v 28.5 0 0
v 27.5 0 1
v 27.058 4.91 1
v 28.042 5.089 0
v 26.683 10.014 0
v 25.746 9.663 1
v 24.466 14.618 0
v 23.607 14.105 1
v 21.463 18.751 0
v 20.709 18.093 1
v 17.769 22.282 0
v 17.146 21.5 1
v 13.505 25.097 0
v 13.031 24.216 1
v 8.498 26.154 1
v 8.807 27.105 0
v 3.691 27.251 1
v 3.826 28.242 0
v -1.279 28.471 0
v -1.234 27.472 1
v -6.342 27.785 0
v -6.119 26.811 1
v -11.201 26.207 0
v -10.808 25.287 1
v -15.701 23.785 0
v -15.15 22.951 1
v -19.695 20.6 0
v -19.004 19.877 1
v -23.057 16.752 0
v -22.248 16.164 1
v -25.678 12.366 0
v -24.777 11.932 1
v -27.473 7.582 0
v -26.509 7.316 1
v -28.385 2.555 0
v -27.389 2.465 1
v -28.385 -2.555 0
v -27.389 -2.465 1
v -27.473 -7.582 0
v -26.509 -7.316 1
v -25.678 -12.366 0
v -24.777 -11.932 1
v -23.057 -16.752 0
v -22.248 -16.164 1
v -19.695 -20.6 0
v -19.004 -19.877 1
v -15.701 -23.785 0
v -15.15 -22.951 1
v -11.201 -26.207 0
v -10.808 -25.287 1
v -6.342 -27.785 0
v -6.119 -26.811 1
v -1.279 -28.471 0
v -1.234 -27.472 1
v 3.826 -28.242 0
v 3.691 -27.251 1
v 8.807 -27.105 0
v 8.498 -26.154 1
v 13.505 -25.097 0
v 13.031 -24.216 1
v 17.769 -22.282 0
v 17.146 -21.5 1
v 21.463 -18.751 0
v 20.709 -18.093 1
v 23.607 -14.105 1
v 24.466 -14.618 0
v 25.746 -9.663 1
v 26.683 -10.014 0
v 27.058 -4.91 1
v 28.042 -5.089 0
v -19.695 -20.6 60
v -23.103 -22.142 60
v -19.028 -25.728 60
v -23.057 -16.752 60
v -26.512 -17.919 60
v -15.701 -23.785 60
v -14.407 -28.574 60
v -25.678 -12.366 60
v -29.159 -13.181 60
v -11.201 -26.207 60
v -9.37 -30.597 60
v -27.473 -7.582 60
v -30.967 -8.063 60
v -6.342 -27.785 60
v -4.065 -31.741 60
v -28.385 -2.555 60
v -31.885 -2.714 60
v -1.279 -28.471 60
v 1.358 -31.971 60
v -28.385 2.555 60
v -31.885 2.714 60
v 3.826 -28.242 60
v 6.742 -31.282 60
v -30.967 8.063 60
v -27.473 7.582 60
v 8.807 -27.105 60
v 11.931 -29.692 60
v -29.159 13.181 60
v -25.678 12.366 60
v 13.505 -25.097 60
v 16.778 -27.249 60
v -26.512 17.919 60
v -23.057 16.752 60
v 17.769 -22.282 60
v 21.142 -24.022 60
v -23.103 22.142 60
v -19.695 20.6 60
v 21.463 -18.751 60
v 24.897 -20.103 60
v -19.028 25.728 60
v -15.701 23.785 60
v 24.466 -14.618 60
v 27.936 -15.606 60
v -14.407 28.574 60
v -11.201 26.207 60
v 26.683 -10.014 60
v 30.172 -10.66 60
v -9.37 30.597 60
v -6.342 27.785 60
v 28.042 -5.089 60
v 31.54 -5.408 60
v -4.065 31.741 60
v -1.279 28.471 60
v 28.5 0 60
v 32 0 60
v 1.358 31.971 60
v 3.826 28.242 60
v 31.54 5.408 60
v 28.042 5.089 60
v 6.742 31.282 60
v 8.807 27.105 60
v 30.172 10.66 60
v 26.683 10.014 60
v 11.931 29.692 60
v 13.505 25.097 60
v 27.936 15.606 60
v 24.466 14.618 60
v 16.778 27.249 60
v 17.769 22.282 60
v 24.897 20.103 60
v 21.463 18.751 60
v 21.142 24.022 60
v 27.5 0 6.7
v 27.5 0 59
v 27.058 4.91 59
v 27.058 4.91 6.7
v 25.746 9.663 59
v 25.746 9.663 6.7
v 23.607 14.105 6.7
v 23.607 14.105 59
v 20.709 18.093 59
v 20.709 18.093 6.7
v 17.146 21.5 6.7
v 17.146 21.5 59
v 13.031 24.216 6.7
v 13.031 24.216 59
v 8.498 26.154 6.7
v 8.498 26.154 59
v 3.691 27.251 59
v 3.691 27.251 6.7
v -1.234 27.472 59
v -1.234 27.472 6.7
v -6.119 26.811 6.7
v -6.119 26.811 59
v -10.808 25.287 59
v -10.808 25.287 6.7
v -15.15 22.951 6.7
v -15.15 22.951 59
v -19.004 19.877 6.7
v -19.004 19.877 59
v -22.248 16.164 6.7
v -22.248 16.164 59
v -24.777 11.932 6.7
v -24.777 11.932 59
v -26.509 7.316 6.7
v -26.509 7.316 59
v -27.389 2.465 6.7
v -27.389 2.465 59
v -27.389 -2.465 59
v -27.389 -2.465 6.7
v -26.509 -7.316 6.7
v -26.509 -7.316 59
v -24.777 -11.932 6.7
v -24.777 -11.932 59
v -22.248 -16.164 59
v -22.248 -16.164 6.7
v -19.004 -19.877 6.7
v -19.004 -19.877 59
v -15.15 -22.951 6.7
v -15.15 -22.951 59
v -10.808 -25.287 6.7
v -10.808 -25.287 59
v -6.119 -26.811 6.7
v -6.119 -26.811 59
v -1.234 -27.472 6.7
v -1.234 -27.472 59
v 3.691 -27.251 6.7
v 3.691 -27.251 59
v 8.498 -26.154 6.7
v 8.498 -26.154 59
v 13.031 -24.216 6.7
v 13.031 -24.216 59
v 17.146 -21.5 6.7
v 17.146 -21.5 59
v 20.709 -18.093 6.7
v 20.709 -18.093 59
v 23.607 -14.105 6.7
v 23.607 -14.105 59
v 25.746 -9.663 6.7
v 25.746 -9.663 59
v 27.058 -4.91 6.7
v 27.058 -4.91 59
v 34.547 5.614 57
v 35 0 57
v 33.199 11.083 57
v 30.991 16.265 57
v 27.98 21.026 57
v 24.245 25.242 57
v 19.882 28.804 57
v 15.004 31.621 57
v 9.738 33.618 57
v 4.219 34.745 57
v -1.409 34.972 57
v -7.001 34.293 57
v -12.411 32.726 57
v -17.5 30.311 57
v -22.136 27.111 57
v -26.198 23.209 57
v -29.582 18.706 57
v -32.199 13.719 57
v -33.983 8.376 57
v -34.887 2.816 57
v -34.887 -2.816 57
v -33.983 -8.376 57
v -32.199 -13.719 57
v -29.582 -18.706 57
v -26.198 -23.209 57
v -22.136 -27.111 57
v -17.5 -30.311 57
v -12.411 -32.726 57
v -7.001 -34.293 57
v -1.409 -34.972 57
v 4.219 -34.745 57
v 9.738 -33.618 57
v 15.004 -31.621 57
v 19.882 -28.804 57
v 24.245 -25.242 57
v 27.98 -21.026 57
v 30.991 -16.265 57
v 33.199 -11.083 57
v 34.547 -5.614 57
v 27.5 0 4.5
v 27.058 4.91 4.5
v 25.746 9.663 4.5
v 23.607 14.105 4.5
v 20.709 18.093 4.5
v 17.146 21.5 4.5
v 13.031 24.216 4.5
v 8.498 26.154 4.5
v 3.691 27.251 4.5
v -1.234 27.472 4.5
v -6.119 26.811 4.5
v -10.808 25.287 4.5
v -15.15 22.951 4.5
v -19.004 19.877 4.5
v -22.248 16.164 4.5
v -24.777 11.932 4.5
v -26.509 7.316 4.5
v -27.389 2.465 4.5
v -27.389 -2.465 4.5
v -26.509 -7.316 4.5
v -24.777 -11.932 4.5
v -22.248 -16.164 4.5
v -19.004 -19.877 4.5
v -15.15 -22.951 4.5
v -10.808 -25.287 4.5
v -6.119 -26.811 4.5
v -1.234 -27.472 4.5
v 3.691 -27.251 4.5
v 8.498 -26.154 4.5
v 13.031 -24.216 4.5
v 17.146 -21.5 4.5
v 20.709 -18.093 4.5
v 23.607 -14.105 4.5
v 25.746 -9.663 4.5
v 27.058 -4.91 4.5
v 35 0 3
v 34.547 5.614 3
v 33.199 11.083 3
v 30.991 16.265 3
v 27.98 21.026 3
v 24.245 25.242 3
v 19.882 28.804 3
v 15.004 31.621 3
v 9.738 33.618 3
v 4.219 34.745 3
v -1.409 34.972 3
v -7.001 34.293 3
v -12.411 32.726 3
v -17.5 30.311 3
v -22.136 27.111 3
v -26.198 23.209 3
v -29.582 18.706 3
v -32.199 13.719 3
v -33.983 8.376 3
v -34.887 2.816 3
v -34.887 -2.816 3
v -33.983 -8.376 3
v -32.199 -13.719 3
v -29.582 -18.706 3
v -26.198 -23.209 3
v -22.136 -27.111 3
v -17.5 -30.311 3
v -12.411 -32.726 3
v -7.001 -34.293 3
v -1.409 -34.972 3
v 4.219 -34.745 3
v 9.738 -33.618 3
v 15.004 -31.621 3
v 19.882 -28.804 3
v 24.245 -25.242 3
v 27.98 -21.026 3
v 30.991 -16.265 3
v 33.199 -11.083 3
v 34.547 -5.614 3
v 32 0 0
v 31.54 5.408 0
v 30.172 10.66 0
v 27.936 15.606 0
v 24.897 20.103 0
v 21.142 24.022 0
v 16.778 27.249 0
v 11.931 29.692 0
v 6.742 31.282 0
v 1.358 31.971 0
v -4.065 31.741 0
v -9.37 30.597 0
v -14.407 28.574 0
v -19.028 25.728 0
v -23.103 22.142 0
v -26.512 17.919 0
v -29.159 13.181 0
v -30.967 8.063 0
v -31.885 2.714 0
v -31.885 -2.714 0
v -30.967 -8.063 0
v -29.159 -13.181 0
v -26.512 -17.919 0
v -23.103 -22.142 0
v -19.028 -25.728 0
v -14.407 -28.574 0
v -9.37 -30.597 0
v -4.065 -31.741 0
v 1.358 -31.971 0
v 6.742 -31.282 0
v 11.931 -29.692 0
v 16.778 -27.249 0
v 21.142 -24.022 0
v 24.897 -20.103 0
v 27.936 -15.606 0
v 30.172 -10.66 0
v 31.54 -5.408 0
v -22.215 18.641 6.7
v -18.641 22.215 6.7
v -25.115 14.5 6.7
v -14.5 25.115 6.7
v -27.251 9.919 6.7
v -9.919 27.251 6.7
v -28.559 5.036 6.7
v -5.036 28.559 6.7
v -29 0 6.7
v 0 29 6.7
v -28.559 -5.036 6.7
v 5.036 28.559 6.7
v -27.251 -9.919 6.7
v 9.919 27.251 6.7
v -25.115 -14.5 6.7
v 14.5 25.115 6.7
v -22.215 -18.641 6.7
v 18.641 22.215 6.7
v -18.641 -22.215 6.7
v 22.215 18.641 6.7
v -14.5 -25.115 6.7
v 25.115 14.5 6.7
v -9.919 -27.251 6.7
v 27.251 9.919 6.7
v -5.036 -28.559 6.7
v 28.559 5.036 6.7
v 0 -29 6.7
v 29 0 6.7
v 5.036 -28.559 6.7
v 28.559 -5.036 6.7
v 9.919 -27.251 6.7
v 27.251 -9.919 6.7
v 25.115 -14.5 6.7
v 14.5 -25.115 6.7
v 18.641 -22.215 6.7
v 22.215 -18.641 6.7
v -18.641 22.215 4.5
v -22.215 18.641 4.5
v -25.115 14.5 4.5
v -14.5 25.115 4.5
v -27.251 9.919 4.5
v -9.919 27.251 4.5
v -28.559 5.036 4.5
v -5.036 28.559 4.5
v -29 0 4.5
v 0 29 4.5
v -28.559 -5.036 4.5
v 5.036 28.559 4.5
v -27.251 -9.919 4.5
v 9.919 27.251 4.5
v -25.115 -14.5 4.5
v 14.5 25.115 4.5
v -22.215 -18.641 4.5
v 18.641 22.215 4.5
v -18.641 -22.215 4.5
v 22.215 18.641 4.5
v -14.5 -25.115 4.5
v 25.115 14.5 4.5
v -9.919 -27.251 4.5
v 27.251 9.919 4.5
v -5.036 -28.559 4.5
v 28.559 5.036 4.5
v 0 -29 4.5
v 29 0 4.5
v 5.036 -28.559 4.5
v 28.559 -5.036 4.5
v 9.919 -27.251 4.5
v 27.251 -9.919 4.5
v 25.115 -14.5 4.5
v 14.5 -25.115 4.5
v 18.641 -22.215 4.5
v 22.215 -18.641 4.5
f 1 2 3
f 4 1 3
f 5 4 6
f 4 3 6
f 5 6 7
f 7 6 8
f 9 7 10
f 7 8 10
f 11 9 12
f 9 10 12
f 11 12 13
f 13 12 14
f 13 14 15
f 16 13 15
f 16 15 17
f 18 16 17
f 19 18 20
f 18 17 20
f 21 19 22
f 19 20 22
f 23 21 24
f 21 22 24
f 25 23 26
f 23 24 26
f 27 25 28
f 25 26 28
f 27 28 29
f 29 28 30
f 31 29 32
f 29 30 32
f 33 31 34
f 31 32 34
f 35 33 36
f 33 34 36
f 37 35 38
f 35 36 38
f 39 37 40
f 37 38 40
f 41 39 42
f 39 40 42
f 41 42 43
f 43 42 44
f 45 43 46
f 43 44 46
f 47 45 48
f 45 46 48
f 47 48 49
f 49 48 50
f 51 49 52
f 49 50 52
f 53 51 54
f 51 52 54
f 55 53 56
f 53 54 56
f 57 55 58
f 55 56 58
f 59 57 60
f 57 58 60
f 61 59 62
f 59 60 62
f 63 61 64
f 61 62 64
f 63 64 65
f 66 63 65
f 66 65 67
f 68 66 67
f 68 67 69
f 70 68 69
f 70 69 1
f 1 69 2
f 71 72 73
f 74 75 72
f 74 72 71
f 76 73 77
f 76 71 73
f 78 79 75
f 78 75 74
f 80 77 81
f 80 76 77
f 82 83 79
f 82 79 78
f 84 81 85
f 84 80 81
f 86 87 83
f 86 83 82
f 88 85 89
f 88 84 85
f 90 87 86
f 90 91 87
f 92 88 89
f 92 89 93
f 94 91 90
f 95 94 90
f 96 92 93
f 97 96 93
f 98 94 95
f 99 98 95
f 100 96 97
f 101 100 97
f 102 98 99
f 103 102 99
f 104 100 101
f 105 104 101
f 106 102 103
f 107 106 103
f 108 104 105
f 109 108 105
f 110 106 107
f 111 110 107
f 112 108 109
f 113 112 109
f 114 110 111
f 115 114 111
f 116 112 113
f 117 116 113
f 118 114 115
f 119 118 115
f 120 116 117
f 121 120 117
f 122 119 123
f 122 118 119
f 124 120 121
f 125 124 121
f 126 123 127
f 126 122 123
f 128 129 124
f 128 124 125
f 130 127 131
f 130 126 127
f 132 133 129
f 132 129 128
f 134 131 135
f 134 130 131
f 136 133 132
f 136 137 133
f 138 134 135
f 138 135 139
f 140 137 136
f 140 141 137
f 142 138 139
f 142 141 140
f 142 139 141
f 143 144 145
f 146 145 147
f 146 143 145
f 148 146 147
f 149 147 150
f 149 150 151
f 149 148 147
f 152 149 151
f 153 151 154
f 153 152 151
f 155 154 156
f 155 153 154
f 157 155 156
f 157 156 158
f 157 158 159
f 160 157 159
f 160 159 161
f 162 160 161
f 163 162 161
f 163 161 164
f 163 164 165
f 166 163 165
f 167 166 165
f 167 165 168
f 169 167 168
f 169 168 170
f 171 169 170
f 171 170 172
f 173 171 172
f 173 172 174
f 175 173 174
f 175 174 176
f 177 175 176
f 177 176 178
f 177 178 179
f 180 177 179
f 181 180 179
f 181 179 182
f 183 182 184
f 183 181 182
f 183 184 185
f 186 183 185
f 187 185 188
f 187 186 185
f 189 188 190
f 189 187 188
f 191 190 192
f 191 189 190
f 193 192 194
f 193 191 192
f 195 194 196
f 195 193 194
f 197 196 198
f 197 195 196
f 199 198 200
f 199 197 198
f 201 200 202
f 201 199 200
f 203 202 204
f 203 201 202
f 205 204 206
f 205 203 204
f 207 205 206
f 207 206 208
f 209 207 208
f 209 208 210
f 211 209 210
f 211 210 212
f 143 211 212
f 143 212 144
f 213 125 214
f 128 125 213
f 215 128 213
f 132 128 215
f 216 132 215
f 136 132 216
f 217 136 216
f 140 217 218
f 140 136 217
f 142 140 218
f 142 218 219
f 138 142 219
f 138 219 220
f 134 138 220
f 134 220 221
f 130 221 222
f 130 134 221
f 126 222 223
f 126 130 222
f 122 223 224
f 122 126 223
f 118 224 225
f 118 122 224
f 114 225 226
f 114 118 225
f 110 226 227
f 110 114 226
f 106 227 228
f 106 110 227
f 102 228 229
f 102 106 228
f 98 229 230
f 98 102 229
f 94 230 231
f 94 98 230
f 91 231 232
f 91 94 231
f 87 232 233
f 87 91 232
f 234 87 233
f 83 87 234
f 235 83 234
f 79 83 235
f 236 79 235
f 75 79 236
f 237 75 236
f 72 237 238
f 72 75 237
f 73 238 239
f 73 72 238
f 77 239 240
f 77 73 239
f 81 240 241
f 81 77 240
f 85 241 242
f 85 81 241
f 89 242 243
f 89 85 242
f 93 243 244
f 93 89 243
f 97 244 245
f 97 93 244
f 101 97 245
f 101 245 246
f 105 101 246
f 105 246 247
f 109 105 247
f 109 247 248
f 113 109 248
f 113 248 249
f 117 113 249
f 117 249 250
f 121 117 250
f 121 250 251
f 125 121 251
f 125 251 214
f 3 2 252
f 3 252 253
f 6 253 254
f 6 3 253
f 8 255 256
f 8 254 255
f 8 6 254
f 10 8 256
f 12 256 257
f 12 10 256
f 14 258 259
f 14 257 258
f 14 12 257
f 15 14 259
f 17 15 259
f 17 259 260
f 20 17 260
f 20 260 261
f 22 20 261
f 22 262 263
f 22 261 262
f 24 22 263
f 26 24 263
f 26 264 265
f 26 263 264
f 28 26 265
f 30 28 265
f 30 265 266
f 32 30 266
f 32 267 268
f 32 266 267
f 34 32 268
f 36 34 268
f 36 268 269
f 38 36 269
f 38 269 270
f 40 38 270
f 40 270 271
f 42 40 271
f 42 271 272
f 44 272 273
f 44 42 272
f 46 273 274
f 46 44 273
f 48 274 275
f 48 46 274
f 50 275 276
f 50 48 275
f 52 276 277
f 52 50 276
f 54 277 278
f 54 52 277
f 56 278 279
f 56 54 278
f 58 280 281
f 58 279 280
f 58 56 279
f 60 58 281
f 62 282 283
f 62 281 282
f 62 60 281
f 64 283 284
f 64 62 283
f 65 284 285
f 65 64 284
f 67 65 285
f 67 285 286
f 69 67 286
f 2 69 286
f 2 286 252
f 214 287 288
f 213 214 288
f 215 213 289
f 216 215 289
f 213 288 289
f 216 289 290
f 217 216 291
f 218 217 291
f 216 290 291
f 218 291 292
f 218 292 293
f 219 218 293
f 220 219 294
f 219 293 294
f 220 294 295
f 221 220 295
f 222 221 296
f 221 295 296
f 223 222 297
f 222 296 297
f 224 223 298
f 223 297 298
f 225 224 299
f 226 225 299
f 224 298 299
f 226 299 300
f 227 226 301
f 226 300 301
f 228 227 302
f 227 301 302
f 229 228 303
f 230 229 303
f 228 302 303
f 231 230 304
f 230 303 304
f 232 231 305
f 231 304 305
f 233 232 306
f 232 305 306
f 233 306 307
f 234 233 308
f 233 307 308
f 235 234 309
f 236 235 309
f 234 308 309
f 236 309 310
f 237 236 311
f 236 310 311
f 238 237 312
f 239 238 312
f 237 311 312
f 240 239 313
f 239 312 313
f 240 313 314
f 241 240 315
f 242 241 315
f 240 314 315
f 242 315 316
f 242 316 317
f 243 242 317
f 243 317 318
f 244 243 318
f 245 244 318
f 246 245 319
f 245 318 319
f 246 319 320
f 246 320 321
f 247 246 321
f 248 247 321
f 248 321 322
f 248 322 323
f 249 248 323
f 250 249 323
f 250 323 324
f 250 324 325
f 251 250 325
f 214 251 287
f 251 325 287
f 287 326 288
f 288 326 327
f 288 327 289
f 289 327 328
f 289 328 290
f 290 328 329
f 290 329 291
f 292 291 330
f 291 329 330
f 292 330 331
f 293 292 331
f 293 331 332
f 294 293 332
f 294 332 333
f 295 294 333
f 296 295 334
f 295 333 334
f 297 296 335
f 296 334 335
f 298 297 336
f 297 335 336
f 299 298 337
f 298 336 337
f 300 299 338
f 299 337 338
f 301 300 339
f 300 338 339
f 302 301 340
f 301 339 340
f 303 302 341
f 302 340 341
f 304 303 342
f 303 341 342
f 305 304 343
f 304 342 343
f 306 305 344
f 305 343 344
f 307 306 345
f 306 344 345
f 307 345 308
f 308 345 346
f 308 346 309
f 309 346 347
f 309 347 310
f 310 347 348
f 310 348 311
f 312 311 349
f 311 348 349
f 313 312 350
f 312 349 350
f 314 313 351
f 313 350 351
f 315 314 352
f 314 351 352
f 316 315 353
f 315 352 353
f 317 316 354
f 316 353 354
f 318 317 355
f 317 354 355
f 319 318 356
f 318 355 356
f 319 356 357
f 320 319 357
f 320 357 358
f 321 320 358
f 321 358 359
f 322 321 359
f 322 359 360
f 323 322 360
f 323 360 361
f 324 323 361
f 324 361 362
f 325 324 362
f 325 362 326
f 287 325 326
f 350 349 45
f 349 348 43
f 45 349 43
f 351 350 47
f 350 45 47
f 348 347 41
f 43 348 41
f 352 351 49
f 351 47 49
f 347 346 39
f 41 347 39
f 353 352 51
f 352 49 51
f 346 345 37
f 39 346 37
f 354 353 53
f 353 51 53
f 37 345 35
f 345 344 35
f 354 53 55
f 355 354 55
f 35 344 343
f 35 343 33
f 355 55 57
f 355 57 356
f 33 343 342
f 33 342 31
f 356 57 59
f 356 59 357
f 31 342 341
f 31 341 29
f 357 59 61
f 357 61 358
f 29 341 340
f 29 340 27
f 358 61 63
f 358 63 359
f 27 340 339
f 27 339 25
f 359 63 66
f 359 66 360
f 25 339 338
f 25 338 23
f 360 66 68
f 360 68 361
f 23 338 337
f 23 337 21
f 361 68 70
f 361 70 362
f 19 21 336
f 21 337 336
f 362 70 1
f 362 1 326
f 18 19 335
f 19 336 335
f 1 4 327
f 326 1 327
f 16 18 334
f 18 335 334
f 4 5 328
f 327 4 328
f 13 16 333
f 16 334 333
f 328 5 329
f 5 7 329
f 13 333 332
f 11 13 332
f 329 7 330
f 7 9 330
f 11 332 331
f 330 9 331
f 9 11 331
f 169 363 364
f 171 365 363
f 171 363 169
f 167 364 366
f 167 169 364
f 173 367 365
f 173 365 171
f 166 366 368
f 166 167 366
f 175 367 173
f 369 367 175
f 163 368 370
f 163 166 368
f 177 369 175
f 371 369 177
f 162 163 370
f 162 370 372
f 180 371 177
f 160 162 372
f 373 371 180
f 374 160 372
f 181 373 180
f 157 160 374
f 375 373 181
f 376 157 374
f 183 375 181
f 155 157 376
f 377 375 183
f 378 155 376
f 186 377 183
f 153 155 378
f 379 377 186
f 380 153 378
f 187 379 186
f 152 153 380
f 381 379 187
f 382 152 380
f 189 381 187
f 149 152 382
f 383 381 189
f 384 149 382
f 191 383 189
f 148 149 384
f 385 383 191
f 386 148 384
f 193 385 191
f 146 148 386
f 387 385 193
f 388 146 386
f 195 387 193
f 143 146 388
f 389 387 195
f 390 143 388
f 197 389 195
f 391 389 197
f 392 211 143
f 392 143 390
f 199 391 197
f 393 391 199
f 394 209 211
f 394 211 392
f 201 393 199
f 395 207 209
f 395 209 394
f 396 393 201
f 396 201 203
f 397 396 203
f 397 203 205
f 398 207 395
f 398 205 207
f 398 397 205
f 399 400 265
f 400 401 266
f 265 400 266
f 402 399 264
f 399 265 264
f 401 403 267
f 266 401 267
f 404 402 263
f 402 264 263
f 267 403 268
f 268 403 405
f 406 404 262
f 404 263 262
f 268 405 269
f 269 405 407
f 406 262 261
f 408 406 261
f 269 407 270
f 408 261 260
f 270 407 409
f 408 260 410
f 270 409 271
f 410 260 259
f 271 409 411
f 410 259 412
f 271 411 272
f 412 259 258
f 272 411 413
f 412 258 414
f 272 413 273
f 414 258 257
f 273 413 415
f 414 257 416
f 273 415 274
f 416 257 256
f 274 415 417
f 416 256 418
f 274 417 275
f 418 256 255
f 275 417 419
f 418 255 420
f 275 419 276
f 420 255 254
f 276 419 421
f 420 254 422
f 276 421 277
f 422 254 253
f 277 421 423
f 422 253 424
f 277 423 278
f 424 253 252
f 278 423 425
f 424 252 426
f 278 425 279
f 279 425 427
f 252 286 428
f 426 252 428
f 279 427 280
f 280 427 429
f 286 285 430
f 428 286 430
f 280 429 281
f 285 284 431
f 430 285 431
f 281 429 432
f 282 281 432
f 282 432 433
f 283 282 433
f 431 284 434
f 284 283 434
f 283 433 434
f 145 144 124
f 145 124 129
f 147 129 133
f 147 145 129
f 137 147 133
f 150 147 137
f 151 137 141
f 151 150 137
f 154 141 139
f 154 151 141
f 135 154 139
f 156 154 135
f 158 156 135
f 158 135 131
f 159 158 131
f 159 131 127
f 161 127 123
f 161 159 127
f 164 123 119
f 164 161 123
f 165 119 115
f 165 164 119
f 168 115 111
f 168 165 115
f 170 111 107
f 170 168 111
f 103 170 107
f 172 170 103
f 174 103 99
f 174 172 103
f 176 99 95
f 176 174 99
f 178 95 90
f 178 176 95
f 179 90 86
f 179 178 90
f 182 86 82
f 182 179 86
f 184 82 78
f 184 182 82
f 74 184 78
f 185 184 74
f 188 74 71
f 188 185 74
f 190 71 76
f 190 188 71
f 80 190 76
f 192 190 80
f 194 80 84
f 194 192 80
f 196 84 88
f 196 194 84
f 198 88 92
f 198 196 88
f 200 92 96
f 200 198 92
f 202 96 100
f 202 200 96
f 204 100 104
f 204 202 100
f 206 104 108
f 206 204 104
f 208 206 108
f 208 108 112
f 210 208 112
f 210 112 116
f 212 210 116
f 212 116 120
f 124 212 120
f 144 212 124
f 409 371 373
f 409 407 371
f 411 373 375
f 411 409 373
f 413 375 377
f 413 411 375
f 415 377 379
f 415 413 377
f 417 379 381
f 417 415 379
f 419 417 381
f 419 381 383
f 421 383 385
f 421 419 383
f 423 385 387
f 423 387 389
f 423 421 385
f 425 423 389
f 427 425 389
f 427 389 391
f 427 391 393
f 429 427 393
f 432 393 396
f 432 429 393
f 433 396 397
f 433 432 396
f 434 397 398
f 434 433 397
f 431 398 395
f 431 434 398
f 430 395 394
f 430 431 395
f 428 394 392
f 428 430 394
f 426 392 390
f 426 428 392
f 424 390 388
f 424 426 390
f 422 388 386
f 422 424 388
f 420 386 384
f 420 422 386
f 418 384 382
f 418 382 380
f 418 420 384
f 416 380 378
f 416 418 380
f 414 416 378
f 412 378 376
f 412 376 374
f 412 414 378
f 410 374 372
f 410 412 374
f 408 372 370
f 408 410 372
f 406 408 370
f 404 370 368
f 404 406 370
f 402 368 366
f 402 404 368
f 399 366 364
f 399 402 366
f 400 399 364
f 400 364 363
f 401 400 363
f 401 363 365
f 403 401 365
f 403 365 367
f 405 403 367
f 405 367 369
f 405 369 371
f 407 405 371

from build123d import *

# Parameters (mm, degrees)
SKETCH_1_R      = 35
SKETCH_1_R_2    = 27.5
EXTRUDE_1_DEPTH = 60
CHAMFER_1_SIZE  = 3
SKETCH_2_W      = 29
SKETCH_2_H      = 2.2
CHAMFER_2_SIZE  = 1


with BuildPart() as part:
    # 草图1 → 凸台-拉伸1 (new body)
    with BuildSketch(Plane.XY):
        Circle(SKETCH_1_R)
        Circle(SKETCH_1_R_2, mode=Mode.SUBTRACT)
    extrude(amount=EXTRUDE_1_DEPTH)

    # 倒角1
    chamfer_1_edges = [part.edges().sort_by_distance(p)[0] for p in [
        (-35, 0, 0),
        (-35, 0, 60),
    ]]
    chamfer(chamfer_1_edges, length=CHAMFER_1_SIZE)

    # 草图2 → 切除-旋转1 (revolve, cut)
    with BuildSketch(Plane(origin=(0, 0, 0), x_dir=(1, 0, 0), z_dir=(0, 1, 0)), mode=Mode.PRIVATE) as cut_revolve_1_sk:
        with Locations((14.5, -5.6)):
            Rectangle(SKETCH_2_W, SKETCH_2_H)
    revolve(cut_revolve_1_sk.sketch.rotate(Axis((0, 0, 0), (0, 0, 1)), 180), axis=Axis((0, 0, 0), (0, 0, 1)), mode=Mode.SUBTRACT)

    # 倒角2
    chamfer_2_edges = [part.edges().sort_by_distance(p)[0] for p in [
        (-27.5, 0, 0),
        (-27.5, 0, 60),
    ]]
    chamfer(chamfer_2_edges, length=CHAMFER_2_SIZE)


solid = part.part
